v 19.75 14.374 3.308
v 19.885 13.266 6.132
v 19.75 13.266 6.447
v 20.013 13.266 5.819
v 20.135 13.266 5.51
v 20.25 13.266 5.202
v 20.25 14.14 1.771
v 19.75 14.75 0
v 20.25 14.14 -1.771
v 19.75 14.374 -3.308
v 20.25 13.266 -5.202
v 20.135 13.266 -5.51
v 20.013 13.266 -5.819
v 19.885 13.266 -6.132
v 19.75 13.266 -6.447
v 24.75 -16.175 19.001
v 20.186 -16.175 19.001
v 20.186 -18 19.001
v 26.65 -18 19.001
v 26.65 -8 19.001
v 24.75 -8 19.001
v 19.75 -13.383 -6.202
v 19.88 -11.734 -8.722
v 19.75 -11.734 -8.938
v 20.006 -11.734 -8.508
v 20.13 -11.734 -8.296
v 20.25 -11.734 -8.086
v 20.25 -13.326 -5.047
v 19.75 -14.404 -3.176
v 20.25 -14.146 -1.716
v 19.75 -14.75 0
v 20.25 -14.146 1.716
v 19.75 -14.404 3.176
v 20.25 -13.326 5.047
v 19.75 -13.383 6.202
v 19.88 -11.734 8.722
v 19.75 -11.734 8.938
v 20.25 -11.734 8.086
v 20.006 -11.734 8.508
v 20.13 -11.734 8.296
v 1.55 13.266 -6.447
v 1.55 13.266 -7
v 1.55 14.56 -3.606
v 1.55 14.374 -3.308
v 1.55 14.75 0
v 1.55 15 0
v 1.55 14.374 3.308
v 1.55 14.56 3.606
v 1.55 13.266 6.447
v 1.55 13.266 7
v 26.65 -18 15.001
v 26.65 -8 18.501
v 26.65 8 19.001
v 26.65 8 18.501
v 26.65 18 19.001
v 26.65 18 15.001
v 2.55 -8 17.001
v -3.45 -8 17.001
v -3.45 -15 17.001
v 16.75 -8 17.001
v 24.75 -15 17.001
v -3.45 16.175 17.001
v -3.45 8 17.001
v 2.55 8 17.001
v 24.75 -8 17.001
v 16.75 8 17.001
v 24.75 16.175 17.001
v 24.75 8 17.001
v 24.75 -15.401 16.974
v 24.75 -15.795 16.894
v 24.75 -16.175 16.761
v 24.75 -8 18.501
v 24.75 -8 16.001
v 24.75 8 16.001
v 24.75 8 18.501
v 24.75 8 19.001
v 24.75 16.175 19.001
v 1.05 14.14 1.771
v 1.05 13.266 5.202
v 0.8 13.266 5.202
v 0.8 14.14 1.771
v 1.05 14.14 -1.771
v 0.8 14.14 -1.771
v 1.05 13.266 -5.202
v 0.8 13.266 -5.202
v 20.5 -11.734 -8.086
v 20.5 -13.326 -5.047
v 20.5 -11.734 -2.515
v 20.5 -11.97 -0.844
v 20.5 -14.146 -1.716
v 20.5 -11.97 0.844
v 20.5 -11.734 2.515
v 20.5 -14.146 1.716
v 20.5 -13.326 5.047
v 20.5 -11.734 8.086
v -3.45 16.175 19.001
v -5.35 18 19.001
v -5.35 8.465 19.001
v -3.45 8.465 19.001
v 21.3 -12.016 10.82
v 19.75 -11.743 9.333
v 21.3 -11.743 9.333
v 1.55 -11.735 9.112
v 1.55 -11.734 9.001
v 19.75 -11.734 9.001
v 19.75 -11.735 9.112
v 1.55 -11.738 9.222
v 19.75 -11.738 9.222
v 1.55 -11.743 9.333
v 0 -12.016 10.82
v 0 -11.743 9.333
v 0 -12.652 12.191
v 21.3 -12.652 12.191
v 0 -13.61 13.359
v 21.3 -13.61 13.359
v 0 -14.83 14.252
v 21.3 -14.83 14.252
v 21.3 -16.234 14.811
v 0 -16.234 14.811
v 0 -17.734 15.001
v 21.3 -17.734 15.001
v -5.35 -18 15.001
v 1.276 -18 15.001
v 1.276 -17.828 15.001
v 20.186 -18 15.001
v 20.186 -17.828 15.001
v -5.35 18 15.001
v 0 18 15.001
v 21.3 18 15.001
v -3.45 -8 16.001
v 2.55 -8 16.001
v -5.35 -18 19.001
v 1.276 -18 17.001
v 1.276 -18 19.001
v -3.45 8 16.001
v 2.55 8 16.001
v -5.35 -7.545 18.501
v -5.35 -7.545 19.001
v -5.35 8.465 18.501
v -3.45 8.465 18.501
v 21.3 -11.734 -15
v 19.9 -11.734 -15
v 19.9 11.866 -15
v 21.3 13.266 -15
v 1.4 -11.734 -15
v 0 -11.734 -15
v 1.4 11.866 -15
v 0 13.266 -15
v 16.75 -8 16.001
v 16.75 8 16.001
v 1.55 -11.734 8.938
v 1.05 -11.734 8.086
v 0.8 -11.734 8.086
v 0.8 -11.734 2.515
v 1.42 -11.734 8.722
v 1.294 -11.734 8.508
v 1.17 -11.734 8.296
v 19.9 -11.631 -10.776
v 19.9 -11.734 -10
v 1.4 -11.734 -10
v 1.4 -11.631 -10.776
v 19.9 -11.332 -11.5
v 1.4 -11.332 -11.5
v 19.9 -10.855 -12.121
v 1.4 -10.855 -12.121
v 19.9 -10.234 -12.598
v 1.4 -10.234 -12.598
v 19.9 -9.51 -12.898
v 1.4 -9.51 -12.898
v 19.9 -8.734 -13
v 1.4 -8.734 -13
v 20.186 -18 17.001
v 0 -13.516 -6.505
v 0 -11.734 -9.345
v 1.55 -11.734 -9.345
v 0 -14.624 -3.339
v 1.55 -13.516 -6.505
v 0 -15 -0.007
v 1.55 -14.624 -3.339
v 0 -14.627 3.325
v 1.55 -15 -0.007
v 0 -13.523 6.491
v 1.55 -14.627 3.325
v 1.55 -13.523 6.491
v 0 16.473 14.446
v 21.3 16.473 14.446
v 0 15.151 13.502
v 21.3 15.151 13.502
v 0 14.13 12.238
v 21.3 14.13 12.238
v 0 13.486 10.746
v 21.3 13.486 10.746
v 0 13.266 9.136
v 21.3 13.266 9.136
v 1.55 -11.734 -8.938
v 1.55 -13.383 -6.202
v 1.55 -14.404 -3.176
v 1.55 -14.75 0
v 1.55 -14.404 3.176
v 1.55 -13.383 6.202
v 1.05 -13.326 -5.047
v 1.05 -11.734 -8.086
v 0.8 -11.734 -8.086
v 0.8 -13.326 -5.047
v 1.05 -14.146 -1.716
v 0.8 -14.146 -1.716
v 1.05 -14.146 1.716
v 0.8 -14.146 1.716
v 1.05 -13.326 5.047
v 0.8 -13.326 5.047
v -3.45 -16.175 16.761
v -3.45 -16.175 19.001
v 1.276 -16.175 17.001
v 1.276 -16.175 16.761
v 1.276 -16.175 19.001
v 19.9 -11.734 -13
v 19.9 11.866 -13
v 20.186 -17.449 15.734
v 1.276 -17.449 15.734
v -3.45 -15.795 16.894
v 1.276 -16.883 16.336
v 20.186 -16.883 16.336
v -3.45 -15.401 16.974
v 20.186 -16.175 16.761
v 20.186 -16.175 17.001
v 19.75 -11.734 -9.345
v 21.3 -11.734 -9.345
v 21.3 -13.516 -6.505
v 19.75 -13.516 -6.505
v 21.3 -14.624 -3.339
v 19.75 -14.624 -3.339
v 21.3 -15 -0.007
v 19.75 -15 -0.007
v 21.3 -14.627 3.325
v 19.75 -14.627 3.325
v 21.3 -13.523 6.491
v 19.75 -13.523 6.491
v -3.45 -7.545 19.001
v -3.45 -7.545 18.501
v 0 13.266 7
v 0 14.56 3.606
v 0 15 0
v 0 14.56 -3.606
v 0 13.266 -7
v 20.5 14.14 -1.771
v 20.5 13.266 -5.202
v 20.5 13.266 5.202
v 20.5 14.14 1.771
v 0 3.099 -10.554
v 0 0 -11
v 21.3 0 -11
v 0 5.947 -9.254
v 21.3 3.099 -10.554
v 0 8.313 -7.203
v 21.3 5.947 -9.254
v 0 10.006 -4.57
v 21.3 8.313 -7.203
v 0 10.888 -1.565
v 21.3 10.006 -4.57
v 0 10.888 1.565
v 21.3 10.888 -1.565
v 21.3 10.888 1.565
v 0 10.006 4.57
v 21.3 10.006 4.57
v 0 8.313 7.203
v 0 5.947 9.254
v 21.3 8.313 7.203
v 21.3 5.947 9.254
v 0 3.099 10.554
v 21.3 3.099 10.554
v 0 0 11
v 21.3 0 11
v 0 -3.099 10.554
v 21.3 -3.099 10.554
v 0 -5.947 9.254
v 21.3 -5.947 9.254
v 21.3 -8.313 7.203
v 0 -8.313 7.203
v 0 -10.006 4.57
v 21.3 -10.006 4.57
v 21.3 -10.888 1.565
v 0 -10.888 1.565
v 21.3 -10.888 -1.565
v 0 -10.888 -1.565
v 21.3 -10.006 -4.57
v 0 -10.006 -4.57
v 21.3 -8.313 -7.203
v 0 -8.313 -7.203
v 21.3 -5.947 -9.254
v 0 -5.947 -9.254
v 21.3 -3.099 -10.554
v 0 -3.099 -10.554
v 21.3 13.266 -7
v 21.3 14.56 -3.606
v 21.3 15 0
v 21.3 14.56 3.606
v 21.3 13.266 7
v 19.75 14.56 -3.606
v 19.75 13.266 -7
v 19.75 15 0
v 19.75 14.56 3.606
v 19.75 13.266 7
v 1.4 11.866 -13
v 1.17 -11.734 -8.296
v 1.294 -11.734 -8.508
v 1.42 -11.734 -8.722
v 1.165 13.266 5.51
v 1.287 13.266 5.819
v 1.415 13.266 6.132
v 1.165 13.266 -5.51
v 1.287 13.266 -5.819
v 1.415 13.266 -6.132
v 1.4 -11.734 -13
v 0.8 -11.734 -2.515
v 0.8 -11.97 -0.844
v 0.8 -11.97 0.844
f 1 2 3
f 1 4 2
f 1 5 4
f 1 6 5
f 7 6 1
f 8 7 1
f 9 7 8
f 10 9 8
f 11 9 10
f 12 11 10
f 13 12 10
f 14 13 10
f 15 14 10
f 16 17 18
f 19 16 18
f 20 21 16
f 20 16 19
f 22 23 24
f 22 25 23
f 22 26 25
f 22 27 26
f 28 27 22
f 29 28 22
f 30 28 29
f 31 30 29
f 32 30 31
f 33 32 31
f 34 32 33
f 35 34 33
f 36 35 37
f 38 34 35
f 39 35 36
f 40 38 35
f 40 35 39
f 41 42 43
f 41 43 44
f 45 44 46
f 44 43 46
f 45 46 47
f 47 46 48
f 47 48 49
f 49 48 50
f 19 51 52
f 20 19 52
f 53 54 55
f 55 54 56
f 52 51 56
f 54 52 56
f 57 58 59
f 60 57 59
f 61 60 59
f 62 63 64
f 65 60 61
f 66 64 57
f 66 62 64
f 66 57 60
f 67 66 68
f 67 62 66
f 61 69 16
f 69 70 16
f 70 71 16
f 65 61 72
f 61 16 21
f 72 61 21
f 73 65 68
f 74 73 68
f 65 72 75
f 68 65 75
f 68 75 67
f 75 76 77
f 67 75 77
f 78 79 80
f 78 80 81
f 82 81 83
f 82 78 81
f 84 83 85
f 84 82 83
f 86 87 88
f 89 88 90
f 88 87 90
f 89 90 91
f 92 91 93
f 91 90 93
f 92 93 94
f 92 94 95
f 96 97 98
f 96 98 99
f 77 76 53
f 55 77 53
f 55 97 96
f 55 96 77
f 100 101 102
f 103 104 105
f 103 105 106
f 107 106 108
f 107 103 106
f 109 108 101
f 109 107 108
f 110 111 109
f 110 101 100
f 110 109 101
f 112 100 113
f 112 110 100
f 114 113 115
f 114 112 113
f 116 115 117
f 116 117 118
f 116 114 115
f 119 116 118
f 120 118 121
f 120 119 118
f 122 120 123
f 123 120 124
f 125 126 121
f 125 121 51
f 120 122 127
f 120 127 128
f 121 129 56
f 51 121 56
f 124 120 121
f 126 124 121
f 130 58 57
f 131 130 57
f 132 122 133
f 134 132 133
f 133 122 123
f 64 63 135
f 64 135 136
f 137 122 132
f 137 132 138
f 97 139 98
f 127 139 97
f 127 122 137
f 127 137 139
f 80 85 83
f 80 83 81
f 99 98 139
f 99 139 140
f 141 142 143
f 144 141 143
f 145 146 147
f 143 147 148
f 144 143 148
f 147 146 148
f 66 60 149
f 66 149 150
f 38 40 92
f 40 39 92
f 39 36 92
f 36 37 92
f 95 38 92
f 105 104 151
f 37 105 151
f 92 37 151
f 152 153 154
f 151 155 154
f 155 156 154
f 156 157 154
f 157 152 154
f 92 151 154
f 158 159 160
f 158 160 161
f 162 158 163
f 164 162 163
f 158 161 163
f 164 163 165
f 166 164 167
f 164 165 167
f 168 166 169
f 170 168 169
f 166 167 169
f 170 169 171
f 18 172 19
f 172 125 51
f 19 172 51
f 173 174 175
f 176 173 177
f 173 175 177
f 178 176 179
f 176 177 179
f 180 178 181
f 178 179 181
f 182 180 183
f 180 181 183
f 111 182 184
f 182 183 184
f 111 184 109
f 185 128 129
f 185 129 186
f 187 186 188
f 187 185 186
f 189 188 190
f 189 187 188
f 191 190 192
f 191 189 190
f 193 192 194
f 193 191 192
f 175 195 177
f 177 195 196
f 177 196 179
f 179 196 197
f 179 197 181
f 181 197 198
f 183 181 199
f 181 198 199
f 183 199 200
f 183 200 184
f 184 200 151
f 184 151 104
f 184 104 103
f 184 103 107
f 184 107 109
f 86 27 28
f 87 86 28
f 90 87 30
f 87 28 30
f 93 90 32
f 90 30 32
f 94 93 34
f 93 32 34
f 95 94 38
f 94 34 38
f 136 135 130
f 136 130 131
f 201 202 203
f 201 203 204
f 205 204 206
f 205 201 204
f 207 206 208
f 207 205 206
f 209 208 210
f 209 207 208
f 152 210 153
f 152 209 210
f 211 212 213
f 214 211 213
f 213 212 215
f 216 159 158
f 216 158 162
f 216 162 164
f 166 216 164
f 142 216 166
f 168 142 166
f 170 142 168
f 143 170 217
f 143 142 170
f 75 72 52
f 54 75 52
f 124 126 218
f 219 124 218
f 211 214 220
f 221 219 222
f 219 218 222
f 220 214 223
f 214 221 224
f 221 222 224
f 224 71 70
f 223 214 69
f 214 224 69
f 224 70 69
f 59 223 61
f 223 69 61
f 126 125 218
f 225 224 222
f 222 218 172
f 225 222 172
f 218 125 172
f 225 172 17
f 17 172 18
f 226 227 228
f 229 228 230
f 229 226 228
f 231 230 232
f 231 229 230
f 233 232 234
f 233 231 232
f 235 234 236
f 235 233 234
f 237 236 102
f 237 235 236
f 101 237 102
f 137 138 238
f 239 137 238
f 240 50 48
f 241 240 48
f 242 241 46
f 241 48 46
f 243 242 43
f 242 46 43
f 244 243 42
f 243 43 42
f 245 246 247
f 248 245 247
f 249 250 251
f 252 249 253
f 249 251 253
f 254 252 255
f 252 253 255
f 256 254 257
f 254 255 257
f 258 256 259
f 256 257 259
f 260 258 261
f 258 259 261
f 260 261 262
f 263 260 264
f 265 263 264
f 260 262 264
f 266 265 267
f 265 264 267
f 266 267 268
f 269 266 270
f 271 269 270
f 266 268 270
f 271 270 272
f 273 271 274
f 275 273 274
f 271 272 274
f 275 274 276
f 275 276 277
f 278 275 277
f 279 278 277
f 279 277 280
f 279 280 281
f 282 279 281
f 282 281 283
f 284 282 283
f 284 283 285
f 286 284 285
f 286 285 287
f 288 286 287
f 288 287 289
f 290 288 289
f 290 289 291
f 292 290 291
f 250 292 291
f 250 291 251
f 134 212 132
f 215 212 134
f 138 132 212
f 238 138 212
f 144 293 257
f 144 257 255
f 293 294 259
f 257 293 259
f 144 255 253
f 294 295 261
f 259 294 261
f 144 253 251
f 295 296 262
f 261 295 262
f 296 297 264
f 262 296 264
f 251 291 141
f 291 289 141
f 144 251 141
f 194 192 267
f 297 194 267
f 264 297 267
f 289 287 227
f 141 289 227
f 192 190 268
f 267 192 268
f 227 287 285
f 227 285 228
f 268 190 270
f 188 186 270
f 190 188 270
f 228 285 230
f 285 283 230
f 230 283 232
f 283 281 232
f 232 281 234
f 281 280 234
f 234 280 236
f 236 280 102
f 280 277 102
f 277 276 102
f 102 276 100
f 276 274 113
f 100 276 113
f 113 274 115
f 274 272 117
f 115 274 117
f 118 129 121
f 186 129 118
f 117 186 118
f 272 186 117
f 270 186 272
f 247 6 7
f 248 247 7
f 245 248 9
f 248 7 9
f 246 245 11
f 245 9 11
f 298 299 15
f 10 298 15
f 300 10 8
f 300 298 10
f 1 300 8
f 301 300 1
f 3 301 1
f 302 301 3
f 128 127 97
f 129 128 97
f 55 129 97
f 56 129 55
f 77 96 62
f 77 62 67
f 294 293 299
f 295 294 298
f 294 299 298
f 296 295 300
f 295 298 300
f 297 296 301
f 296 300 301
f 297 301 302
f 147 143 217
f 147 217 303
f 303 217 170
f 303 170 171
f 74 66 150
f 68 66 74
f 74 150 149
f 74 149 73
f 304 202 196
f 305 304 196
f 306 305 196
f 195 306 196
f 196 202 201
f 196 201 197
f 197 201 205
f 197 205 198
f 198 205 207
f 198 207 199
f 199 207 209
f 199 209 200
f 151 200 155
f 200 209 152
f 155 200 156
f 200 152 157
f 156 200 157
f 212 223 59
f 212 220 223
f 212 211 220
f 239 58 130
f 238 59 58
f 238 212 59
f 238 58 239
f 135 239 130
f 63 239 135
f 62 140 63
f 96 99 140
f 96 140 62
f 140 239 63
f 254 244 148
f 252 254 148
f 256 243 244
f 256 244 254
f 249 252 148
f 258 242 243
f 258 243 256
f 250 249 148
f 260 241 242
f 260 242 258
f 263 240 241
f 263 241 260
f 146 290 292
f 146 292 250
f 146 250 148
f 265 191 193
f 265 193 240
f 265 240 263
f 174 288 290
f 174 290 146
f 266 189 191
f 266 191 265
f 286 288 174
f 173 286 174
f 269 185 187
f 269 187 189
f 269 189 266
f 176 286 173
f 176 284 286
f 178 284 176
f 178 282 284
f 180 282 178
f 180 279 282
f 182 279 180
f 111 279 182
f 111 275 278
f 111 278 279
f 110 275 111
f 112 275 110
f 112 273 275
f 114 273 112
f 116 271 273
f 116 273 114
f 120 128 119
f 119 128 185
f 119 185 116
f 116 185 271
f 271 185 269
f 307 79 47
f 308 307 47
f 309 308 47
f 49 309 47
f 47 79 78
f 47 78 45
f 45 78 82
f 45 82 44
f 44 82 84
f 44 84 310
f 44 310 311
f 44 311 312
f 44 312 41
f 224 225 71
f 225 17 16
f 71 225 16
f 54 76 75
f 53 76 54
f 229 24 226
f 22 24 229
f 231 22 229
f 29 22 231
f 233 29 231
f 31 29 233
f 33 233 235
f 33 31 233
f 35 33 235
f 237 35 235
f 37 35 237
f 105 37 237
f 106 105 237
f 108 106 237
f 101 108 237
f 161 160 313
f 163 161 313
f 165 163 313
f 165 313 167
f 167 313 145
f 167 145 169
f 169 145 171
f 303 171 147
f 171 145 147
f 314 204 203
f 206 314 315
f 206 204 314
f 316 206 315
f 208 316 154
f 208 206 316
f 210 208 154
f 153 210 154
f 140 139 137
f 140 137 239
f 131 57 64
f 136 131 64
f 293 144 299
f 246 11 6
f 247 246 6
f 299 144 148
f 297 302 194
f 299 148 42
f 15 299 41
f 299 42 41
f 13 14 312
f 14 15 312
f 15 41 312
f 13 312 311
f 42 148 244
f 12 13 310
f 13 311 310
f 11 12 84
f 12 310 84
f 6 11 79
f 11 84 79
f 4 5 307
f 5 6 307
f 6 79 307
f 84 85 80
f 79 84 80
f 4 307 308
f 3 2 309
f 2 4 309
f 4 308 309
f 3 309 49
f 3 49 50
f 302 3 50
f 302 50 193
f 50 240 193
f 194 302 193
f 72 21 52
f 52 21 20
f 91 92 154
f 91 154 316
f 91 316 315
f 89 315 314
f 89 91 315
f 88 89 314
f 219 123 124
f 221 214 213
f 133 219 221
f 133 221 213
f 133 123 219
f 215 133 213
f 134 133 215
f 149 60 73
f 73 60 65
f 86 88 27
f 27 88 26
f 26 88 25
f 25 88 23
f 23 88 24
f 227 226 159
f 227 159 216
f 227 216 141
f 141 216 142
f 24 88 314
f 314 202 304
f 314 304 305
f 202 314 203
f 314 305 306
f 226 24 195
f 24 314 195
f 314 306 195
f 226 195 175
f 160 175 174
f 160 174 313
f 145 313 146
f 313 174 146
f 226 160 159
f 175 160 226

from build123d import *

# Parameters (mm, degrees)
SKETCH6_R                = 15
SKETCH6_R_2              = 11
BOSS_EXTRUDE2_DEPTH      = 21.3
SKETCH4_W                = 19.7
SKETCH4_H                = 3
BOSS_EXTRUDE3_REACH      = 38.107
SKETCH9_W                = 21.3
SKETCH9_H                = 9.16515139
BOSS_EXTRUDE4_START      = 0.75
SKETCH10_R               = 15
SKETCH10_R_2             = 14.25
BOSS_EXTRUDE4_DEPTH      = 0.75
CHAMFER1_SIZE            = 0.5
CHAMFER1_OF_MIRROR1_SIZE = 0.5
BOSS_EXTRUDE6_DEPTH      = 21.3
SKETCH17_W               = 18.5
SKETCH17_H               = 23.6
CUT_EXTRUDE3_DEPTH       = 2
SKETCH14_R               = 11
CUT_EXTRUDE2_DEPTH       = 31.061936082
SKETCH18_W               = 32
SKETCH18_H               = 36
BOSS_EXTRUDE7_DEPTH      = 4
SKETCH19_W               = 28.2
SKETCH19_H               = 32.35
CUT_EXTRUDE4_DEPTH       = 2
SKETCH20_W               = 6
SKETCH20_H               = 16
SKETCH20_W_2             = 8
CUT_EXTRUDE5_DEPTH       = 1
SKETCH21_W               = 1.9
SKETCH21_H               = 16
SKETCH21_H_2             = 16.00994424
CUT_EXTRUDE6_DEPTH       = 0.5
SKETCH22_W               = 18.909915591
SKETCH22_H               = 1.825
CUT_EXTRUDE7_DEPTH       = 2
FILLET1_R                = 6
FILLET2_R                = 3


# Read off the part's stored shape, not the designer's step: Boss-Extrude6
with BuildPart() as part:
    # Sketch6 → Boss-Extrude2 (new body)
    with BuildSketch(Plane(origin=(0, 0, 0), x_dir=(0, 0, -1), z_dir=(1, 0, 0))):
        Circle(SKETCH6_R)
        Circle(SKETCH6_R_2, mode=Mode.SUBTRACT)
    extrude(amount=BOSS_EXTRUDE2_DEPTH)

    # Sketch4 → Cut-Revolve1 (revolve, cut)
    with BuildSketch(Plane.XY, mode=Mode.PRIVATE) as cut_revolve1_sk:
        with Locations((10.65, -13.5)):
            Rectangle(SKETCH4_W, SKETCH4_H)
    revolve(cut_revolve1_sk.sketch.rotate(Axis((-11.602577702, 0, 0), (1, 0, 0)), 270), axis=Axis((-11.602577702, 0, 0), (1, 0, 0)), mode=Mode.SUBTRACT)

    # Sketch9 → Boss-Extrude3 (add, up to next)
    with BuildSketch(Plane.XY.offset(-10), mode=Mode.PRIVATE) as boss_extrude3_sk1:
        with Locations((10.65, 0)):
            Rectangle(SKETCH9_W, SKETCH9_H)
    boss_extrude3_tool1 = extrude(boss_extrude3_sk1.sketch, amount=-BOSS_EXTRUDE3_REACH, mode=Mode.PRIVATE) - part.part
    add(boss_extrude3_tool1.solids().sort_by_distance((10.65, 0, -10))[0])

    # Sketch10 → Boss-Extrude4 (add)
    with BuildSketch(Plane.ZY.offset(-20.5).offset(BOSS_EXTRUDE4_START)):
        Circle(SKETCH10_R)
        Circle(SKETCH10_R_2, mode=Mode.SUBTRACT)
    boss_extrude4 = extrude(amount=-BOSS_EXTRUDE4_DEPTH)

    # Chamfer1
    chamfer1_edges = [part.edges().sort_by_distance(p)[0] for p in [
        (19.75, 0, -14.25),
    ]]
    chamfer(chamfer1_edges, length=CHAMFER1_SIZE)

    # Mirror1: Boss-Extrude4 across plane
    add(boss_extrude4.mirror(Plane.ZY.offset(-10.65)))

    # Chamfer1 of Mirror1
    chamfer1_of_mirror1_edges = [part.edges().sort_by_distance(p)[0] for p in [
        (1.55, 0, -14.25),
    ]]
    chamfer(chamfer1_of_mirror1_edges, length=CHAMFER1_OF_MIRROR1_SIZE)

    # Boss-Extrude6 outline → Boss-Extrude6 (add)
    with BuildSketch(Plane.YZ):
        with BuildLine():
            Line((13.266430469, -15), (13.266430469, 15.001))
            Line((13.266430469, 15.001), (-11.733569531, 15.001))
            Line((-11.733569531, 15.001), (-11.733569531, 2.514626428))
            ThreePointArc((-11.733569531, 2.514626428), (12, 0), (-11.733569531, -2.514626428))
            Line((-11.733569531, -2.514626428), (-11.733569531, -15))
            Line((-11.733569531, -15), (13.266430469, -15))
        make_face()
    extrude(amount=BOSS_EXTRUDE6_DEPTH)

    # Sketch17 → Cut-Extrude3 (cut)
    with BuildSketch(Plane(origin=(0, 0, -15), x_dir=(-1, 0, 0), z_dir=(0, 0, -1))):
        with Locations((-10.65, 0.066430469)):
            Rectangle(SKETCH17_W, SKETCH17_H)
    extrude(amount=-CUT_EXTRUDE3_DEPTH, mode=Mode.SUBTRACT)

    # Sketch14 → Cut-Extrude2 (cut, through all)
    with BuildSketch(Plane(origin=(21.3, 0, 0), x_dir=(0, 0, -1), z_dir=(1, 0, 0))):
        Circle(SKETCH14_R)
    extrude(amount=-CUT_EXTRUDE2_DEPTH, mode=Mode.SUBTRACT)

    # Sketch18 → Boss-Extrude7 (add)
    with BuildSketch(Plane.XY.offset(15.001)):
        with Locations((10.65, 0)):
            Rectangle(SKETCH18_W, SKETCH18_H)
    extrude(amount=BOSS_EXTRUDE7_DEPTH)

    # Sketch19 → Cut-Extrude4 (cut)
    with BuildSketch(Plane.XY.offset(19.001)):
        with Locations((10.65, 0)):
            Rectangle(SKETCH19_W, SKETCH19_H)
    extrude(amount=-CUT_EXTRUDE4_DEPTH, mode=Mode.SUBTRACT)

    # Sketch20 → Cut-Extrude5 (cut)
    with BuildSketch(Plane.XY.offset(17.001)):
        with Locations((-0.45, 0)):
            Rectangle(SKETCH20_W, SKETCH20_H)
        with Locations((20.75, 0)):
            Rectangle(SKETCH20_W_2, SKETCH20_H)
    extrude(amount=-CUT_EXTRUDE5_DEPTH, mode=Mode.SUBTRACT)

    # Sketch21 → Cut-Extrude6 (cut)
    with BuildSketch(Plane.XY.offset(19.001)):
        with Locations((25.7, 0)):
            Rectangle(SKETCH21_W, SKETCH21_H)
        with Locations((-4.4, 0.459988306)):
            Rectangle(SKETCH21_W, SKETCH21_H_2)
    extrude(amount=-CUT_EXTRUDE6_DEPTH, mode=Mode.SUBTRACT)

    # Sketch22 → Cut-Extrude7 (cut)
    with BuildSketch(Plane.XY.offset(19.001)):
        with Locations((10.730756322, -17.0875)):
            Rectangle(SKETCH22_W, SKETCH22_H)
    extrude(amount=-CUT_EXTRUDE7_DEPTH, mode=Mode.SUBTRACT)

    # Fillet1
    # the kernel refuses this fillet: 6 mm, written as the material it adds along each edge
    with BuildSketch(Plane(origin=(0, -11.733569531, 15.001), x_dir=(0, -1, 0), z_dir=(1, 0, 0))) as fillet1_piece_1:
        with BuildLine():
            CenterArc((FILLET1_R, FILLET1_R), FILLET1_R, 180, 90)
            Line((0, FILLET1_R), (-FILLET1_R * 0.02, FILLET1_R))
            Line((-FILLET1_R * 0.02, FILLET1_R), (-FILLET1_R * 0.02, -FILLET1_R * 0.02))
            Line((-FILLET1_R * 0.02, -FILLET1_R * 0.02), (FILLET1_R, -FILLET1_R * 0.02))
            Line((FILLET1_R, -FILLET1_R * 0.02), (FILLET1_R, 0))
        make_face()
    extrude(amount=21.3)
    with BuildSketch(Plane(origin=(0, 13.266430469, 15.001), x_dir=(0, 1, 0), z_dir=(1, 0, 0))) as fillet1_piece_2:
        with BuildLine():
            CenterArc((6, -5.86482343), FILLET1_R, 102.185166617, 77.814833383)
            Line((0, -5.86482343), (-0.12, -5.86482343))
            Line((-0.12, -5.86482343), (-0.12, 0))
            Line((-0.12, 0), (0, 0.12))
            ThreePointArc((0, 0.12), (2.366784766, 0.12), (4.708240922, 0.117296469))
            Line((4.708240922, 0.117296469), (4.733569531, 0))
        make_face()
    extrude(amount=21.3)

    # Fillet2
    # the kernel refuses this fillet: 3 mm, written as the material it takes off along each edge
    with BuildSketch(Plane(origin=(1.4, -11.733569531, -13), x_dir=(0, -1.6111438109570978e-10, 1.0), z_dir=(1, 0, 0))) as fillet2_piece_1:
        with BuildLine():
            CenterArc((FILLET2_R, -FILLET2_R), FILLET2_R, 89.999999991, 90)
            Line((-FILLET2_R * 1.6111438107e-10, -FILLET2_R), (0, 0))
            Line((0, 0), (FILLET2_R, 0))
        make_face()
    extrude(amount=18.5, mode=Mode.SUBTRACT)
    with BuildSketch(Plane(origin=(27.685714118, -18, 17.001), x_dir=(0, 0, -1), z_dir=(-1, 0, 0))) as fillet2_piece_2_section:
        with BuildLine():
            CenterArc((FILLET2_R, -FILLET2_R), FILLET2_R, 90, 90)
            Line((0, -FILLET2_R), (0, 0))
            Line((0, 0), (FILLET2_R, 0))
        make_face()
    fillet2_piece_2 = extrude(amount=33.90991559, mode=Mode.PRIVATE)
    fillet2_piece_2 = split(fillet2_piece_2, bisect_by=Plane(origin=(22.467857059, -16.175, 16.929617158), z_dir=(0, 1, 0)), keep=Keep.TOP, mode=Mode.PRIVATE)
    fillet2_piece_2 = split(fillet2_piece_2, bisect_by=Plane(origin=(24.75, -15.883648186, 16.929617158), z_dir=(-1, 0, 0)), keep=Keep.TOP, mode=Mode.PRIVATE)
    fillet2_piece_2 = split(fillet2_piece_2, bisect_by=Plane(origin=(-3.45, -15.883648186, 16.929617158), z_dir=(1, 0, 0)), keep=Keep.TOP, mode=Mode.PRIVATE)
    add(fillet2_piece_2, mode=Mode.SUBTRACT)
    with BuildSketch(Plane(origin=(20.185714118, -18, 17.001), x_dir=(0, 0, -1), z_dir=(-1, 0, 0))) as fillet2_piece_3:
        with BuildLine():
            CenterArc((FILLET2_R, -FILLET2_R), FILLET2_R, 90, 90)
            Line((0, -FILLET2_R), (0, 0))
            Line((0, 0), (FILLET2_R, 0))
        make_face()
    extrude(amount=18.90991559, mode=Mode.SUBTRACT)


solid = part.part
